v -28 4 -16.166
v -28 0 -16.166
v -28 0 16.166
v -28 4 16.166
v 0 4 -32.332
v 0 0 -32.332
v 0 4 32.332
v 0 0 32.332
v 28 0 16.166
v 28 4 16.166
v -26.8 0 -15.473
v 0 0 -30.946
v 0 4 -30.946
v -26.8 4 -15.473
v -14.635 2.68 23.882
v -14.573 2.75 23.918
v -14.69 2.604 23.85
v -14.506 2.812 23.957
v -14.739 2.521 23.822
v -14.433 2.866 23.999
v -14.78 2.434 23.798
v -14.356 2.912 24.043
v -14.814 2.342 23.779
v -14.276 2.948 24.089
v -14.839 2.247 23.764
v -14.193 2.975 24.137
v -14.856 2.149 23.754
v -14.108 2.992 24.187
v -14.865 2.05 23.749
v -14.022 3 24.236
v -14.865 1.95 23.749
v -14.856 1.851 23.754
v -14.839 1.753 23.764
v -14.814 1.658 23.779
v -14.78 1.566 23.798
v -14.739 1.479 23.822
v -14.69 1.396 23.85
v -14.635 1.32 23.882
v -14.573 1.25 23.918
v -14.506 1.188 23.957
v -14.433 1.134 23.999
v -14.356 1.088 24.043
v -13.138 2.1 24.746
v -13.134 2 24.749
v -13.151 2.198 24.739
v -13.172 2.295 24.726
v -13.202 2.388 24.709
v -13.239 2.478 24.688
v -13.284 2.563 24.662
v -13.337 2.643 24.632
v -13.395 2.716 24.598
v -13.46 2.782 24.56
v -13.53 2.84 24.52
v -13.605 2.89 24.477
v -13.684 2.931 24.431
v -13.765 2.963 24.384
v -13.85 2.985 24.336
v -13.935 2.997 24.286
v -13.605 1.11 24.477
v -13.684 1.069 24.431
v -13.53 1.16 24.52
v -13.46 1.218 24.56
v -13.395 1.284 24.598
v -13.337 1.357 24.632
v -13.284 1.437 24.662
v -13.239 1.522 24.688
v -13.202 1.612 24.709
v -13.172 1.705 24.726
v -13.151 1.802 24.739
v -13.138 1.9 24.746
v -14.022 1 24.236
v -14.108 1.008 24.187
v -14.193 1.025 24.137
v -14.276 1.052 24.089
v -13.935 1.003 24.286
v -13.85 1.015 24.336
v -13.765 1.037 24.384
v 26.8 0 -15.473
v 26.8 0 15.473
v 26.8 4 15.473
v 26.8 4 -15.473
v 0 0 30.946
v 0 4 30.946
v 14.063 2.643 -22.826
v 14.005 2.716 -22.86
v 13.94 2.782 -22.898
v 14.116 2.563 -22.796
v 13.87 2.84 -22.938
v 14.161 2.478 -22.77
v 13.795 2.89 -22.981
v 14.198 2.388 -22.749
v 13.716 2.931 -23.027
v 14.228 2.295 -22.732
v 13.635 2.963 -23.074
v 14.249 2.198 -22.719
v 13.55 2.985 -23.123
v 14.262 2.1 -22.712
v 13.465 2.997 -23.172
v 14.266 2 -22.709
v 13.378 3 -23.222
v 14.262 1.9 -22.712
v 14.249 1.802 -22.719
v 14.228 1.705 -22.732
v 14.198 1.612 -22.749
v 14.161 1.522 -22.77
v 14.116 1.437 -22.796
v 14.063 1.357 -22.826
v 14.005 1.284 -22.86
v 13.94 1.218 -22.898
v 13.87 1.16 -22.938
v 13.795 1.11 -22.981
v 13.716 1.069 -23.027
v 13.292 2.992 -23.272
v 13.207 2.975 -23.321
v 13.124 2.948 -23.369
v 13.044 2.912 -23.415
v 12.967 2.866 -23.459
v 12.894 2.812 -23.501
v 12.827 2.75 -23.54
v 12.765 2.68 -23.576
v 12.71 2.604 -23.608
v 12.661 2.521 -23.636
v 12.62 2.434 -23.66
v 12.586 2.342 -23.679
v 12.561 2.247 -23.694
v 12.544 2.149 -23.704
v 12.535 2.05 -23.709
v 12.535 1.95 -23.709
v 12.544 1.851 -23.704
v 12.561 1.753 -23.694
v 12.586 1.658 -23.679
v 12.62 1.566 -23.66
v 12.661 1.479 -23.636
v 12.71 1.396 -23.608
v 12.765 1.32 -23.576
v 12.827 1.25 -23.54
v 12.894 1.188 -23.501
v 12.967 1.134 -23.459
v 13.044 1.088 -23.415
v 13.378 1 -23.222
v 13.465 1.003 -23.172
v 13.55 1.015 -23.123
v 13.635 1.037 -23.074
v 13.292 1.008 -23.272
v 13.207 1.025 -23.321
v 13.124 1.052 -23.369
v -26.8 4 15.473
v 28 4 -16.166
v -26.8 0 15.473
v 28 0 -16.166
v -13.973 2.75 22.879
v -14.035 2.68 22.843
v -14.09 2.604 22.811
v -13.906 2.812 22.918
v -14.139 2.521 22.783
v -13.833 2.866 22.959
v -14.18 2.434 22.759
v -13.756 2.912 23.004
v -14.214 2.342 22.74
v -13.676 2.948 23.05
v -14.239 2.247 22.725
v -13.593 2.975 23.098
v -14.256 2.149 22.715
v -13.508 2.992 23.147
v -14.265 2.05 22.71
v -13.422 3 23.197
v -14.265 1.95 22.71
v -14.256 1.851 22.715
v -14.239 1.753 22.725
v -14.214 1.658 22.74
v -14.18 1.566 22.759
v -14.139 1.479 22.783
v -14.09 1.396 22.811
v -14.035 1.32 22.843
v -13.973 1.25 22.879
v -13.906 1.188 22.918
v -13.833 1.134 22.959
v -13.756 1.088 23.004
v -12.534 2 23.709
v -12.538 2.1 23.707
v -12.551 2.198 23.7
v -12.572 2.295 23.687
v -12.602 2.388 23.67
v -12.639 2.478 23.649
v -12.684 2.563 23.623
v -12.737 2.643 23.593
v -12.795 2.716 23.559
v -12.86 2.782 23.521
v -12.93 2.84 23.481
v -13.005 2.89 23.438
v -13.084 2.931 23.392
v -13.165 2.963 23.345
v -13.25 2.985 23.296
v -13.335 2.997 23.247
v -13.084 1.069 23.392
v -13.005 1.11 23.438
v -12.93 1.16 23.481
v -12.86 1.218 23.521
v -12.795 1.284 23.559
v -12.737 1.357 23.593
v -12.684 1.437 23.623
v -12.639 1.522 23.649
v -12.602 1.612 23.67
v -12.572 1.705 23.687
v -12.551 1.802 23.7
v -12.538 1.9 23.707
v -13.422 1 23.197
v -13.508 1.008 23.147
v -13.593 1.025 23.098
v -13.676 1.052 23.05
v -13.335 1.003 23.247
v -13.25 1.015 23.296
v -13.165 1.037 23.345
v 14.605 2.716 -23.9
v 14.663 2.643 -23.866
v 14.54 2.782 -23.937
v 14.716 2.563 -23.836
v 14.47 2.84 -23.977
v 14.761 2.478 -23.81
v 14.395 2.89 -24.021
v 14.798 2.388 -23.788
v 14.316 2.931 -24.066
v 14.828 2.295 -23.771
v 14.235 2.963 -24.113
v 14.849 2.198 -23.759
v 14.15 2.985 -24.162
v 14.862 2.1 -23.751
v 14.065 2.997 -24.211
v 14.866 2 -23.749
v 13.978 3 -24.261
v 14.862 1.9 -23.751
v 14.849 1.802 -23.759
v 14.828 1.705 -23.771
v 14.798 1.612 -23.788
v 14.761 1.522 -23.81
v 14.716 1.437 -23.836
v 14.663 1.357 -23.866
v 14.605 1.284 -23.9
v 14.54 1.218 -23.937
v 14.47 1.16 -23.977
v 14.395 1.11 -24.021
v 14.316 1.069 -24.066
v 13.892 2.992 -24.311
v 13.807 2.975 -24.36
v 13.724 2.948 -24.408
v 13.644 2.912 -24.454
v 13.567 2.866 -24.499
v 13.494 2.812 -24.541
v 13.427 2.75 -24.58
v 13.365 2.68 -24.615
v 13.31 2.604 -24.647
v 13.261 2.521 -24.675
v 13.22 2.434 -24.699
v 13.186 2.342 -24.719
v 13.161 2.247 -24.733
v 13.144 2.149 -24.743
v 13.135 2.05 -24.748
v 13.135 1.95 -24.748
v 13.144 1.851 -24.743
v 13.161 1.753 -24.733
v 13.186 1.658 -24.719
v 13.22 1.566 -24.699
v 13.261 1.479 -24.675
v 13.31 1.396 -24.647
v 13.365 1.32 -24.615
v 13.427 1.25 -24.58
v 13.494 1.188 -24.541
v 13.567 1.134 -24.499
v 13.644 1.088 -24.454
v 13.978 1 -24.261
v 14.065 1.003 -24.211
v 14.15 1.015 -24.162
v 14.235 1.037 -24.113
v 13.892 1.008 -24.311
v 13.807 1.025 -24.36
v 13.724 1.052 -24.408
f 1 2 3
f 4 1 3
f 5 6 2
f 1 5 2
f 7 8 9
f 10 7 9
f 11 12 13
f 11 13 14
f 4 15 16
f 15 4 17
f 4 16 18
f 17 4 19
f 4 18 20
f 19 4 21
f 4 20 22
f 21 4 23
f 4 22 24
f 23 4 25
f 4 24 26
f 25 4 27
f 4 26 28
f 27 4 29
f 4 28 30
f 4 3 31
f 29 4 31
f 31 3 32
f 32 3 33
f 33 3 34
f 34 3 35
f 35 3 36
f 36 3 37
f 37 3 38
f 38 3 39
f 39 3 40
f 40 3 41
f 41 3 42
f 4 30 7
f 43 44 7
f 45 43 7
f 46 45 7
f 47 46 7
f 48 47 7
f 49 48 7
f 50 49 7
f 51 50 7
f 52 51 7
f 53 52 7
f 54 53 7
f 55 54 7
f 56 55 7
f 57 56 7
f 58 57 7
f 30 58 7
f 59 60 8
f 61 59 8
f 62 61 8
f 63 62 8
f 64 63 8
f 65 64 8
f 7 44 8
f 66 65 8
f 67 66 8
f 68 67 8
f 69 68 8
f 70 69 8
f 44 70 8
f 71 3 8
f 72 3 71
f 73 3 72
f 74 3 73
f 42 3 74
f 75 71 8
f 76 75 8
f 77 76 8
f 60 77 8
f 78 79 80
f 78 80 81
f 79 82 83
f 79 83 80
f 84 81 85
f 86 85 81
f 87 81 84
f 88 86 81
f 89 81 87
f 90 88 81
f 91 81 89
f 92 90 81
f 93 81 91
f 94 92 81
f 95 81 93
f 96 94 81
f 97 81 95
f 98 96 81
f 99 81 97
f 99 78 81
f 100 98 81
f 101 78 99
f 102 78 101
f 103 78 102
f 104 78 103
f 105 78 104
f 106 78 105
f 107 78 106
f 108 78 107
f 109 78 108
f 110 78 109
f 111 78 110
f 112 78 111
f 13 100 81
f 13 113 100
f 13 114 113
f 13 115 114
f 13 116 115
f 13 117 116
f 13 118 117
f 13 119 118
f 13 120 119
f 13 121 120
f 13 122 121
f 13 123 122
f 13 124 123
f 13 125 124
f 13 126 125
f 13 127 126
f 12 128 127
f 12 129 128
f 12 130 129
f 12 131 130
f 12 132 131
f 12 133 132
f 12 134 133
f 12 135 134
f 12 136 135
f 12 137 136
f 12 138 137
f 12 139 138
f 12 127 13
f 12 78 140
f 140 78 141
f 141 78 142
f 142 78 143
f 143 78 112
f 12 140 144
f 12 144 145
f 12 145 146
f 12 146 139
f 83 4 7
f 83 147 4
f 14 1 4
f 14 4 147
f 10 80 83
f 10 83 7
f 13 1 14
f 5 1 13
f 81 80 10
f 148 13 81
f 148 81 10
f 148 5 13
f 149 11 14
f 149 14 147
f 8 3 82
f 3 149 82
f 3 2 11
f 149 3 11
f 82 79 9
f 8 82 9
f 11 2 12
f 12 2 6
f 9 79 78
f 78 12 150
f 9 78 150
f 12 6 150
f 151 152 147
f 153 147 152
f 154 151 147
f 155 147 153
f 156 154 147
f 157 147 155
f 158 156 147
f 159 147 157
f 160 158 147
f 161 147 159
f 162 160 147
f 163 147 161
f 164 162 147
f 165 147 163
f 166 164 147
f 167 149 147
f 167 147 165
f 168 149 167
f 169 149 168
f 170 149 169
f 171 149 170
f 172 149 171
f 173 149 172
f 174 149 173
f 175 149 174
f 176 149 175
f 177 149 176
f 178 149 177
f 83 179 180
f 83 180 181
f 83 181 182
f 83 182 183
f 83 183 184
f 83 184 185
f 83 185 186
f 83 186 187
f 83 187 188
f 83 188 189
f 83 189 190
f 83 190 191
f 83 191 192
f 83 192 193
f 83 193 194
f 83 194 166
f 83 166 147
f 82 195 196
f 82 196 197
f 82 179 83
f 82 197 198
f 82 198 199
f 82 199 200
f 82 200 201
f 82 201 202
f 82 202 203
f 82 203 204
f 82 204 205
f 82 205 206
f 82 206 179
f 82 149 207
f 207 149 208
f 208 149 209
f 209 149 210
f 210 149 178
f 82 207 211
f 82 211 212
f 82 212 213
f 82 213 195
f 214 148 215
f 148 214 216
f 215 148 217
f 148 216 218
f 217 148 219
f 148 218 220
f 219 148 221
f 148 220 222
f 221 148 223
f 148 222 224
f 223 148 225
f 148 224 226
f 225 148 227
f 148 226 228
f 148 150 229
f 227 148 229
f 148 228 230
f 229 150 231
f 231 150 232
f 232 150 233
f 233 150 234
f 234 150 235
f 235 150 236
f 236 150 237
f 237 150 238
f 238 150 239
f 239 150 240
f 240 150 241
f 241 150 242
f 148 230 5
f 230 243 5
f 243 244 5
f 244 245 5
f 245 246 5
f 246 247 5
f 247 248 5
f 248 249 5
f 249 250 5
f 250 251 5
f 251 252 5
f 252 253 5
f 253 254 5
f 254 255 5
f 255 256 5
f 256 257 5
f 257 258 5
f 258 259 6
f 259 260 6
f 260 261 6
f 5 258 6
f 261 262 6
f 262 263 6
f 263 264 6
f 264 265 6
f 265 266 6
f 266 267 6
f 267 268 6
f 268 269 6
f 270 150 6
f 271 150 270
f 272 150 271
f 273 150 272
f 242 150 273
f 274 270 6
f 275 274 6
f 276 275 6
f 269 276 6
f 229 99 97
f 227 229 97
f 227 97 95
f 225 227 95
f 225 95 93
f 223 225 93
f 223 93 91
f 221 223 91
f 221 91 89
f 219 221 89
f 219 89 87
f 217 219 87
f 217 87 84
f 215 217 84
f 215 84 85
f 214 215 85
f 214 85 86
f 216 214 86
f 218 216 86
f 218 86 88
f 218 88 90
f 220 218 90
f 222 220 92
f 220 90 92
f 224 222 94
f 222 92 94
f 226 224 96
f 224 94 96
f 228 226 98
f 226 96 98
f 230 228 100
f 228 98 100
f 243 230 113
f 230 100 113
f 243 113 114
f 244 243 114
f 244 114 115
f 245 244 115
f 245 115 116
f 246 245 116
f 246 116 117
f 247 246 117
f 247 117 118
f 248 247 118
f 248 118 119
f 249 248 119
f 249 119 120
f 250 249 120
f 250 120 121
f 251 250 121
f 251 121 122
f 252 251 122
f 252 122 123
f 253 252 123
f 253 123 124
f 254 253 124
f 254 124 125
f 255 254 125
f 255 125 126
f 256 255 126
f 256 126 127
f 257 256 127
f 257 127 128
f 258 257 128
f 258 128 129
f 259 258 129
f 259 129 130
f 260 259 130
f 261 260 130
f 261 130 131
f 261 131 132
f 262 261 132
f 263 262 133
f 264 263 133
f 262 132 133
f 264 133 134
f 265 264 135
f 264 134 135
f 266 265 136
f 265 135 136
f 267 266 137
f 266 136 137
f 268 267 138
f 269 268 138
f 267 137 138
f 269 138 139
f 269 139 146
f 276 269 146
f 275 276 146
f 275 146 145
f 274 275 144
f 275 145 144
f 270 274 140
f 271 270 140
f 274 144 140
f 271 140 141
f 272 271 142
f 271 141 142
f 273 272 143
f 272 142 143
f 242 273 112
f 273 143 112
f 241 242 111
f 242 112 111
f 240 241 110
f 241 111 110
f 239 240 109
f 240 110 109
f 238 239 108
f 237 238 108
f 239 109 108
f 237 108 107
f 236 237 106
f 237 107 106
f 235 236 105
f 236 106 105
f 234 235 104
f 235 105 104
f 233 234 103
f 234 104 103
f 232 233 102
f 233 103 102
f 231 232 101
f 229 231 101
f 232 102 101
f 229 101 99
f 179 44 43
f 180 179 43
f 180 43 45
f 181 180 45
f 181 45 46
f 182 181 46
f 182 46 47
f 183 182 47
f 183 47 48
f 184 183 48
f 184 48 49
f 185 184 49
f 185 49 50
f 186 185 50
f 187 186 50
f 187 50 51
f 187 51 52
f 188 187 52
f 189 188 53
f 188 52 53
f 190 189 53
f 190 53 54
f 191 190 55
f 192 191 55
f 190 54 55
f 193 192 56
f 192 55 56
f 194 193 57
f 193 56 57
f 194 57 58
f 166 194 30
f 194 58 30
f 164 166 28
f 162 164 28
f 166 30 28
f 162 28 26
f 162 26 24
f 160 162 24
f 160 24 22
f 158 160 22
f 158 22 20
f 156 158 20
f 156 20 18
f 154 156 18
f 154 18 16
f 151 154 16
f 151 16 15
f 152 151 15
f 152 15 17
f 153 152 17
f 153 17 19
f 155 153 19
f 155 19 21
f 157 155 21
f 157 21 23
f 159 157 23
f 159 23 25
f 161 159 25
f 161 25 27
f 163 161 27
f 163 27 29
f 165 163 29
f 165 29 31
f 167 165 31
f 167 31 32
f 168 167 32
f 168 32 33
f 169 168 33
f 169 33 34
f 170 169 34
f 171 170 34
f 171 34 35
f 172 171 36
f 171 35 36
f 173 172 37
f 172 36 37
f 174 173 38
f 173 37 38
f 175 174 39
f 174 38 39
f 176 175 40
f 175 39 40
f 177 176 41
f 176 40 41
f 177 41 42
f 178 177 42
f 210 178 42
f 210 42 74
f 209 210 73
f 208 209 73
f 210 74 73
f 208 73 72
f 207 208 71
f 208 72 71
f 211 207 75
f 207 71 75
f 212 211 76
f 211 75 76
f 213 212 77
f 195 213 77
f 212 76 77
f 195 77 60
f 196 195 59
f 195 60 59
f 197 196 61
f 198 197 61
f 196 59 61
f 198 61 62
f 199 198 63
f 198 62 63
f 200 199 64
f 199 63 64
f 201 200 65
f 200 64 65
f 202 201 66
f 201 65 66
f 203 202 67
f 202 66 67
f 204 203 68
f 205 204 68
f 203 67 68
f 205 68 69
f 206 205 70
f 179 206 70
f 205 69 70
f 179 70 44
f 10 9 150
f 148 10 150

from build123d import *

# Parameters (mm, degrees)
RESSALTO_EXTRUS_O1_DEPTH = 4
ESBO_O2_R                = 1
CORTE_EXTRUS_O1_DEPTH    = 71.578561429


with BuildPart() as part:
    # Esboço1 → Ressalto-extrusão1 (new body)
    with BuildSketch(Plane(origin=(0, 0, 0), x_dir=(1, 0, 0), z_dir=(0, 1, 0))):
        Polygon((28, -16.165807537), (28, 16.165807537), (0, 32.331615075), (-28, 16.165807537), (-28, -16.165807537), (0, -32.331615075), align=None)
        Polygon((26.8, 15.472987214), (0, 30.945974429), (-26.8, 15.472987214), (-26.8, -15.472987214), (0, -30.945974429), (26.8, -15.472987214), align=None, mode=Mode.SUBTRACT)
    extrude(amount=RESSALTO_EXTRUS_O1_DEPTH)

    # Esboço2 → Corte-extrusão1 (cut, through all)
    with BuildSketch(Plane(origin=(-14, 0, 24.248711306), x_dir=(0.8660254037844387, 0, 0.49999999999999994), z_dir=(-0.4999999999999999, 0, 0.8660254037844386))):
        with Locations((0, 2)):
            Circle(ESBO_O2_R)
    extrude(amount=-CORTE_EXTRUS_O1_DEPTH, mode=Mode.SUBTRACT)


solid = part.part
